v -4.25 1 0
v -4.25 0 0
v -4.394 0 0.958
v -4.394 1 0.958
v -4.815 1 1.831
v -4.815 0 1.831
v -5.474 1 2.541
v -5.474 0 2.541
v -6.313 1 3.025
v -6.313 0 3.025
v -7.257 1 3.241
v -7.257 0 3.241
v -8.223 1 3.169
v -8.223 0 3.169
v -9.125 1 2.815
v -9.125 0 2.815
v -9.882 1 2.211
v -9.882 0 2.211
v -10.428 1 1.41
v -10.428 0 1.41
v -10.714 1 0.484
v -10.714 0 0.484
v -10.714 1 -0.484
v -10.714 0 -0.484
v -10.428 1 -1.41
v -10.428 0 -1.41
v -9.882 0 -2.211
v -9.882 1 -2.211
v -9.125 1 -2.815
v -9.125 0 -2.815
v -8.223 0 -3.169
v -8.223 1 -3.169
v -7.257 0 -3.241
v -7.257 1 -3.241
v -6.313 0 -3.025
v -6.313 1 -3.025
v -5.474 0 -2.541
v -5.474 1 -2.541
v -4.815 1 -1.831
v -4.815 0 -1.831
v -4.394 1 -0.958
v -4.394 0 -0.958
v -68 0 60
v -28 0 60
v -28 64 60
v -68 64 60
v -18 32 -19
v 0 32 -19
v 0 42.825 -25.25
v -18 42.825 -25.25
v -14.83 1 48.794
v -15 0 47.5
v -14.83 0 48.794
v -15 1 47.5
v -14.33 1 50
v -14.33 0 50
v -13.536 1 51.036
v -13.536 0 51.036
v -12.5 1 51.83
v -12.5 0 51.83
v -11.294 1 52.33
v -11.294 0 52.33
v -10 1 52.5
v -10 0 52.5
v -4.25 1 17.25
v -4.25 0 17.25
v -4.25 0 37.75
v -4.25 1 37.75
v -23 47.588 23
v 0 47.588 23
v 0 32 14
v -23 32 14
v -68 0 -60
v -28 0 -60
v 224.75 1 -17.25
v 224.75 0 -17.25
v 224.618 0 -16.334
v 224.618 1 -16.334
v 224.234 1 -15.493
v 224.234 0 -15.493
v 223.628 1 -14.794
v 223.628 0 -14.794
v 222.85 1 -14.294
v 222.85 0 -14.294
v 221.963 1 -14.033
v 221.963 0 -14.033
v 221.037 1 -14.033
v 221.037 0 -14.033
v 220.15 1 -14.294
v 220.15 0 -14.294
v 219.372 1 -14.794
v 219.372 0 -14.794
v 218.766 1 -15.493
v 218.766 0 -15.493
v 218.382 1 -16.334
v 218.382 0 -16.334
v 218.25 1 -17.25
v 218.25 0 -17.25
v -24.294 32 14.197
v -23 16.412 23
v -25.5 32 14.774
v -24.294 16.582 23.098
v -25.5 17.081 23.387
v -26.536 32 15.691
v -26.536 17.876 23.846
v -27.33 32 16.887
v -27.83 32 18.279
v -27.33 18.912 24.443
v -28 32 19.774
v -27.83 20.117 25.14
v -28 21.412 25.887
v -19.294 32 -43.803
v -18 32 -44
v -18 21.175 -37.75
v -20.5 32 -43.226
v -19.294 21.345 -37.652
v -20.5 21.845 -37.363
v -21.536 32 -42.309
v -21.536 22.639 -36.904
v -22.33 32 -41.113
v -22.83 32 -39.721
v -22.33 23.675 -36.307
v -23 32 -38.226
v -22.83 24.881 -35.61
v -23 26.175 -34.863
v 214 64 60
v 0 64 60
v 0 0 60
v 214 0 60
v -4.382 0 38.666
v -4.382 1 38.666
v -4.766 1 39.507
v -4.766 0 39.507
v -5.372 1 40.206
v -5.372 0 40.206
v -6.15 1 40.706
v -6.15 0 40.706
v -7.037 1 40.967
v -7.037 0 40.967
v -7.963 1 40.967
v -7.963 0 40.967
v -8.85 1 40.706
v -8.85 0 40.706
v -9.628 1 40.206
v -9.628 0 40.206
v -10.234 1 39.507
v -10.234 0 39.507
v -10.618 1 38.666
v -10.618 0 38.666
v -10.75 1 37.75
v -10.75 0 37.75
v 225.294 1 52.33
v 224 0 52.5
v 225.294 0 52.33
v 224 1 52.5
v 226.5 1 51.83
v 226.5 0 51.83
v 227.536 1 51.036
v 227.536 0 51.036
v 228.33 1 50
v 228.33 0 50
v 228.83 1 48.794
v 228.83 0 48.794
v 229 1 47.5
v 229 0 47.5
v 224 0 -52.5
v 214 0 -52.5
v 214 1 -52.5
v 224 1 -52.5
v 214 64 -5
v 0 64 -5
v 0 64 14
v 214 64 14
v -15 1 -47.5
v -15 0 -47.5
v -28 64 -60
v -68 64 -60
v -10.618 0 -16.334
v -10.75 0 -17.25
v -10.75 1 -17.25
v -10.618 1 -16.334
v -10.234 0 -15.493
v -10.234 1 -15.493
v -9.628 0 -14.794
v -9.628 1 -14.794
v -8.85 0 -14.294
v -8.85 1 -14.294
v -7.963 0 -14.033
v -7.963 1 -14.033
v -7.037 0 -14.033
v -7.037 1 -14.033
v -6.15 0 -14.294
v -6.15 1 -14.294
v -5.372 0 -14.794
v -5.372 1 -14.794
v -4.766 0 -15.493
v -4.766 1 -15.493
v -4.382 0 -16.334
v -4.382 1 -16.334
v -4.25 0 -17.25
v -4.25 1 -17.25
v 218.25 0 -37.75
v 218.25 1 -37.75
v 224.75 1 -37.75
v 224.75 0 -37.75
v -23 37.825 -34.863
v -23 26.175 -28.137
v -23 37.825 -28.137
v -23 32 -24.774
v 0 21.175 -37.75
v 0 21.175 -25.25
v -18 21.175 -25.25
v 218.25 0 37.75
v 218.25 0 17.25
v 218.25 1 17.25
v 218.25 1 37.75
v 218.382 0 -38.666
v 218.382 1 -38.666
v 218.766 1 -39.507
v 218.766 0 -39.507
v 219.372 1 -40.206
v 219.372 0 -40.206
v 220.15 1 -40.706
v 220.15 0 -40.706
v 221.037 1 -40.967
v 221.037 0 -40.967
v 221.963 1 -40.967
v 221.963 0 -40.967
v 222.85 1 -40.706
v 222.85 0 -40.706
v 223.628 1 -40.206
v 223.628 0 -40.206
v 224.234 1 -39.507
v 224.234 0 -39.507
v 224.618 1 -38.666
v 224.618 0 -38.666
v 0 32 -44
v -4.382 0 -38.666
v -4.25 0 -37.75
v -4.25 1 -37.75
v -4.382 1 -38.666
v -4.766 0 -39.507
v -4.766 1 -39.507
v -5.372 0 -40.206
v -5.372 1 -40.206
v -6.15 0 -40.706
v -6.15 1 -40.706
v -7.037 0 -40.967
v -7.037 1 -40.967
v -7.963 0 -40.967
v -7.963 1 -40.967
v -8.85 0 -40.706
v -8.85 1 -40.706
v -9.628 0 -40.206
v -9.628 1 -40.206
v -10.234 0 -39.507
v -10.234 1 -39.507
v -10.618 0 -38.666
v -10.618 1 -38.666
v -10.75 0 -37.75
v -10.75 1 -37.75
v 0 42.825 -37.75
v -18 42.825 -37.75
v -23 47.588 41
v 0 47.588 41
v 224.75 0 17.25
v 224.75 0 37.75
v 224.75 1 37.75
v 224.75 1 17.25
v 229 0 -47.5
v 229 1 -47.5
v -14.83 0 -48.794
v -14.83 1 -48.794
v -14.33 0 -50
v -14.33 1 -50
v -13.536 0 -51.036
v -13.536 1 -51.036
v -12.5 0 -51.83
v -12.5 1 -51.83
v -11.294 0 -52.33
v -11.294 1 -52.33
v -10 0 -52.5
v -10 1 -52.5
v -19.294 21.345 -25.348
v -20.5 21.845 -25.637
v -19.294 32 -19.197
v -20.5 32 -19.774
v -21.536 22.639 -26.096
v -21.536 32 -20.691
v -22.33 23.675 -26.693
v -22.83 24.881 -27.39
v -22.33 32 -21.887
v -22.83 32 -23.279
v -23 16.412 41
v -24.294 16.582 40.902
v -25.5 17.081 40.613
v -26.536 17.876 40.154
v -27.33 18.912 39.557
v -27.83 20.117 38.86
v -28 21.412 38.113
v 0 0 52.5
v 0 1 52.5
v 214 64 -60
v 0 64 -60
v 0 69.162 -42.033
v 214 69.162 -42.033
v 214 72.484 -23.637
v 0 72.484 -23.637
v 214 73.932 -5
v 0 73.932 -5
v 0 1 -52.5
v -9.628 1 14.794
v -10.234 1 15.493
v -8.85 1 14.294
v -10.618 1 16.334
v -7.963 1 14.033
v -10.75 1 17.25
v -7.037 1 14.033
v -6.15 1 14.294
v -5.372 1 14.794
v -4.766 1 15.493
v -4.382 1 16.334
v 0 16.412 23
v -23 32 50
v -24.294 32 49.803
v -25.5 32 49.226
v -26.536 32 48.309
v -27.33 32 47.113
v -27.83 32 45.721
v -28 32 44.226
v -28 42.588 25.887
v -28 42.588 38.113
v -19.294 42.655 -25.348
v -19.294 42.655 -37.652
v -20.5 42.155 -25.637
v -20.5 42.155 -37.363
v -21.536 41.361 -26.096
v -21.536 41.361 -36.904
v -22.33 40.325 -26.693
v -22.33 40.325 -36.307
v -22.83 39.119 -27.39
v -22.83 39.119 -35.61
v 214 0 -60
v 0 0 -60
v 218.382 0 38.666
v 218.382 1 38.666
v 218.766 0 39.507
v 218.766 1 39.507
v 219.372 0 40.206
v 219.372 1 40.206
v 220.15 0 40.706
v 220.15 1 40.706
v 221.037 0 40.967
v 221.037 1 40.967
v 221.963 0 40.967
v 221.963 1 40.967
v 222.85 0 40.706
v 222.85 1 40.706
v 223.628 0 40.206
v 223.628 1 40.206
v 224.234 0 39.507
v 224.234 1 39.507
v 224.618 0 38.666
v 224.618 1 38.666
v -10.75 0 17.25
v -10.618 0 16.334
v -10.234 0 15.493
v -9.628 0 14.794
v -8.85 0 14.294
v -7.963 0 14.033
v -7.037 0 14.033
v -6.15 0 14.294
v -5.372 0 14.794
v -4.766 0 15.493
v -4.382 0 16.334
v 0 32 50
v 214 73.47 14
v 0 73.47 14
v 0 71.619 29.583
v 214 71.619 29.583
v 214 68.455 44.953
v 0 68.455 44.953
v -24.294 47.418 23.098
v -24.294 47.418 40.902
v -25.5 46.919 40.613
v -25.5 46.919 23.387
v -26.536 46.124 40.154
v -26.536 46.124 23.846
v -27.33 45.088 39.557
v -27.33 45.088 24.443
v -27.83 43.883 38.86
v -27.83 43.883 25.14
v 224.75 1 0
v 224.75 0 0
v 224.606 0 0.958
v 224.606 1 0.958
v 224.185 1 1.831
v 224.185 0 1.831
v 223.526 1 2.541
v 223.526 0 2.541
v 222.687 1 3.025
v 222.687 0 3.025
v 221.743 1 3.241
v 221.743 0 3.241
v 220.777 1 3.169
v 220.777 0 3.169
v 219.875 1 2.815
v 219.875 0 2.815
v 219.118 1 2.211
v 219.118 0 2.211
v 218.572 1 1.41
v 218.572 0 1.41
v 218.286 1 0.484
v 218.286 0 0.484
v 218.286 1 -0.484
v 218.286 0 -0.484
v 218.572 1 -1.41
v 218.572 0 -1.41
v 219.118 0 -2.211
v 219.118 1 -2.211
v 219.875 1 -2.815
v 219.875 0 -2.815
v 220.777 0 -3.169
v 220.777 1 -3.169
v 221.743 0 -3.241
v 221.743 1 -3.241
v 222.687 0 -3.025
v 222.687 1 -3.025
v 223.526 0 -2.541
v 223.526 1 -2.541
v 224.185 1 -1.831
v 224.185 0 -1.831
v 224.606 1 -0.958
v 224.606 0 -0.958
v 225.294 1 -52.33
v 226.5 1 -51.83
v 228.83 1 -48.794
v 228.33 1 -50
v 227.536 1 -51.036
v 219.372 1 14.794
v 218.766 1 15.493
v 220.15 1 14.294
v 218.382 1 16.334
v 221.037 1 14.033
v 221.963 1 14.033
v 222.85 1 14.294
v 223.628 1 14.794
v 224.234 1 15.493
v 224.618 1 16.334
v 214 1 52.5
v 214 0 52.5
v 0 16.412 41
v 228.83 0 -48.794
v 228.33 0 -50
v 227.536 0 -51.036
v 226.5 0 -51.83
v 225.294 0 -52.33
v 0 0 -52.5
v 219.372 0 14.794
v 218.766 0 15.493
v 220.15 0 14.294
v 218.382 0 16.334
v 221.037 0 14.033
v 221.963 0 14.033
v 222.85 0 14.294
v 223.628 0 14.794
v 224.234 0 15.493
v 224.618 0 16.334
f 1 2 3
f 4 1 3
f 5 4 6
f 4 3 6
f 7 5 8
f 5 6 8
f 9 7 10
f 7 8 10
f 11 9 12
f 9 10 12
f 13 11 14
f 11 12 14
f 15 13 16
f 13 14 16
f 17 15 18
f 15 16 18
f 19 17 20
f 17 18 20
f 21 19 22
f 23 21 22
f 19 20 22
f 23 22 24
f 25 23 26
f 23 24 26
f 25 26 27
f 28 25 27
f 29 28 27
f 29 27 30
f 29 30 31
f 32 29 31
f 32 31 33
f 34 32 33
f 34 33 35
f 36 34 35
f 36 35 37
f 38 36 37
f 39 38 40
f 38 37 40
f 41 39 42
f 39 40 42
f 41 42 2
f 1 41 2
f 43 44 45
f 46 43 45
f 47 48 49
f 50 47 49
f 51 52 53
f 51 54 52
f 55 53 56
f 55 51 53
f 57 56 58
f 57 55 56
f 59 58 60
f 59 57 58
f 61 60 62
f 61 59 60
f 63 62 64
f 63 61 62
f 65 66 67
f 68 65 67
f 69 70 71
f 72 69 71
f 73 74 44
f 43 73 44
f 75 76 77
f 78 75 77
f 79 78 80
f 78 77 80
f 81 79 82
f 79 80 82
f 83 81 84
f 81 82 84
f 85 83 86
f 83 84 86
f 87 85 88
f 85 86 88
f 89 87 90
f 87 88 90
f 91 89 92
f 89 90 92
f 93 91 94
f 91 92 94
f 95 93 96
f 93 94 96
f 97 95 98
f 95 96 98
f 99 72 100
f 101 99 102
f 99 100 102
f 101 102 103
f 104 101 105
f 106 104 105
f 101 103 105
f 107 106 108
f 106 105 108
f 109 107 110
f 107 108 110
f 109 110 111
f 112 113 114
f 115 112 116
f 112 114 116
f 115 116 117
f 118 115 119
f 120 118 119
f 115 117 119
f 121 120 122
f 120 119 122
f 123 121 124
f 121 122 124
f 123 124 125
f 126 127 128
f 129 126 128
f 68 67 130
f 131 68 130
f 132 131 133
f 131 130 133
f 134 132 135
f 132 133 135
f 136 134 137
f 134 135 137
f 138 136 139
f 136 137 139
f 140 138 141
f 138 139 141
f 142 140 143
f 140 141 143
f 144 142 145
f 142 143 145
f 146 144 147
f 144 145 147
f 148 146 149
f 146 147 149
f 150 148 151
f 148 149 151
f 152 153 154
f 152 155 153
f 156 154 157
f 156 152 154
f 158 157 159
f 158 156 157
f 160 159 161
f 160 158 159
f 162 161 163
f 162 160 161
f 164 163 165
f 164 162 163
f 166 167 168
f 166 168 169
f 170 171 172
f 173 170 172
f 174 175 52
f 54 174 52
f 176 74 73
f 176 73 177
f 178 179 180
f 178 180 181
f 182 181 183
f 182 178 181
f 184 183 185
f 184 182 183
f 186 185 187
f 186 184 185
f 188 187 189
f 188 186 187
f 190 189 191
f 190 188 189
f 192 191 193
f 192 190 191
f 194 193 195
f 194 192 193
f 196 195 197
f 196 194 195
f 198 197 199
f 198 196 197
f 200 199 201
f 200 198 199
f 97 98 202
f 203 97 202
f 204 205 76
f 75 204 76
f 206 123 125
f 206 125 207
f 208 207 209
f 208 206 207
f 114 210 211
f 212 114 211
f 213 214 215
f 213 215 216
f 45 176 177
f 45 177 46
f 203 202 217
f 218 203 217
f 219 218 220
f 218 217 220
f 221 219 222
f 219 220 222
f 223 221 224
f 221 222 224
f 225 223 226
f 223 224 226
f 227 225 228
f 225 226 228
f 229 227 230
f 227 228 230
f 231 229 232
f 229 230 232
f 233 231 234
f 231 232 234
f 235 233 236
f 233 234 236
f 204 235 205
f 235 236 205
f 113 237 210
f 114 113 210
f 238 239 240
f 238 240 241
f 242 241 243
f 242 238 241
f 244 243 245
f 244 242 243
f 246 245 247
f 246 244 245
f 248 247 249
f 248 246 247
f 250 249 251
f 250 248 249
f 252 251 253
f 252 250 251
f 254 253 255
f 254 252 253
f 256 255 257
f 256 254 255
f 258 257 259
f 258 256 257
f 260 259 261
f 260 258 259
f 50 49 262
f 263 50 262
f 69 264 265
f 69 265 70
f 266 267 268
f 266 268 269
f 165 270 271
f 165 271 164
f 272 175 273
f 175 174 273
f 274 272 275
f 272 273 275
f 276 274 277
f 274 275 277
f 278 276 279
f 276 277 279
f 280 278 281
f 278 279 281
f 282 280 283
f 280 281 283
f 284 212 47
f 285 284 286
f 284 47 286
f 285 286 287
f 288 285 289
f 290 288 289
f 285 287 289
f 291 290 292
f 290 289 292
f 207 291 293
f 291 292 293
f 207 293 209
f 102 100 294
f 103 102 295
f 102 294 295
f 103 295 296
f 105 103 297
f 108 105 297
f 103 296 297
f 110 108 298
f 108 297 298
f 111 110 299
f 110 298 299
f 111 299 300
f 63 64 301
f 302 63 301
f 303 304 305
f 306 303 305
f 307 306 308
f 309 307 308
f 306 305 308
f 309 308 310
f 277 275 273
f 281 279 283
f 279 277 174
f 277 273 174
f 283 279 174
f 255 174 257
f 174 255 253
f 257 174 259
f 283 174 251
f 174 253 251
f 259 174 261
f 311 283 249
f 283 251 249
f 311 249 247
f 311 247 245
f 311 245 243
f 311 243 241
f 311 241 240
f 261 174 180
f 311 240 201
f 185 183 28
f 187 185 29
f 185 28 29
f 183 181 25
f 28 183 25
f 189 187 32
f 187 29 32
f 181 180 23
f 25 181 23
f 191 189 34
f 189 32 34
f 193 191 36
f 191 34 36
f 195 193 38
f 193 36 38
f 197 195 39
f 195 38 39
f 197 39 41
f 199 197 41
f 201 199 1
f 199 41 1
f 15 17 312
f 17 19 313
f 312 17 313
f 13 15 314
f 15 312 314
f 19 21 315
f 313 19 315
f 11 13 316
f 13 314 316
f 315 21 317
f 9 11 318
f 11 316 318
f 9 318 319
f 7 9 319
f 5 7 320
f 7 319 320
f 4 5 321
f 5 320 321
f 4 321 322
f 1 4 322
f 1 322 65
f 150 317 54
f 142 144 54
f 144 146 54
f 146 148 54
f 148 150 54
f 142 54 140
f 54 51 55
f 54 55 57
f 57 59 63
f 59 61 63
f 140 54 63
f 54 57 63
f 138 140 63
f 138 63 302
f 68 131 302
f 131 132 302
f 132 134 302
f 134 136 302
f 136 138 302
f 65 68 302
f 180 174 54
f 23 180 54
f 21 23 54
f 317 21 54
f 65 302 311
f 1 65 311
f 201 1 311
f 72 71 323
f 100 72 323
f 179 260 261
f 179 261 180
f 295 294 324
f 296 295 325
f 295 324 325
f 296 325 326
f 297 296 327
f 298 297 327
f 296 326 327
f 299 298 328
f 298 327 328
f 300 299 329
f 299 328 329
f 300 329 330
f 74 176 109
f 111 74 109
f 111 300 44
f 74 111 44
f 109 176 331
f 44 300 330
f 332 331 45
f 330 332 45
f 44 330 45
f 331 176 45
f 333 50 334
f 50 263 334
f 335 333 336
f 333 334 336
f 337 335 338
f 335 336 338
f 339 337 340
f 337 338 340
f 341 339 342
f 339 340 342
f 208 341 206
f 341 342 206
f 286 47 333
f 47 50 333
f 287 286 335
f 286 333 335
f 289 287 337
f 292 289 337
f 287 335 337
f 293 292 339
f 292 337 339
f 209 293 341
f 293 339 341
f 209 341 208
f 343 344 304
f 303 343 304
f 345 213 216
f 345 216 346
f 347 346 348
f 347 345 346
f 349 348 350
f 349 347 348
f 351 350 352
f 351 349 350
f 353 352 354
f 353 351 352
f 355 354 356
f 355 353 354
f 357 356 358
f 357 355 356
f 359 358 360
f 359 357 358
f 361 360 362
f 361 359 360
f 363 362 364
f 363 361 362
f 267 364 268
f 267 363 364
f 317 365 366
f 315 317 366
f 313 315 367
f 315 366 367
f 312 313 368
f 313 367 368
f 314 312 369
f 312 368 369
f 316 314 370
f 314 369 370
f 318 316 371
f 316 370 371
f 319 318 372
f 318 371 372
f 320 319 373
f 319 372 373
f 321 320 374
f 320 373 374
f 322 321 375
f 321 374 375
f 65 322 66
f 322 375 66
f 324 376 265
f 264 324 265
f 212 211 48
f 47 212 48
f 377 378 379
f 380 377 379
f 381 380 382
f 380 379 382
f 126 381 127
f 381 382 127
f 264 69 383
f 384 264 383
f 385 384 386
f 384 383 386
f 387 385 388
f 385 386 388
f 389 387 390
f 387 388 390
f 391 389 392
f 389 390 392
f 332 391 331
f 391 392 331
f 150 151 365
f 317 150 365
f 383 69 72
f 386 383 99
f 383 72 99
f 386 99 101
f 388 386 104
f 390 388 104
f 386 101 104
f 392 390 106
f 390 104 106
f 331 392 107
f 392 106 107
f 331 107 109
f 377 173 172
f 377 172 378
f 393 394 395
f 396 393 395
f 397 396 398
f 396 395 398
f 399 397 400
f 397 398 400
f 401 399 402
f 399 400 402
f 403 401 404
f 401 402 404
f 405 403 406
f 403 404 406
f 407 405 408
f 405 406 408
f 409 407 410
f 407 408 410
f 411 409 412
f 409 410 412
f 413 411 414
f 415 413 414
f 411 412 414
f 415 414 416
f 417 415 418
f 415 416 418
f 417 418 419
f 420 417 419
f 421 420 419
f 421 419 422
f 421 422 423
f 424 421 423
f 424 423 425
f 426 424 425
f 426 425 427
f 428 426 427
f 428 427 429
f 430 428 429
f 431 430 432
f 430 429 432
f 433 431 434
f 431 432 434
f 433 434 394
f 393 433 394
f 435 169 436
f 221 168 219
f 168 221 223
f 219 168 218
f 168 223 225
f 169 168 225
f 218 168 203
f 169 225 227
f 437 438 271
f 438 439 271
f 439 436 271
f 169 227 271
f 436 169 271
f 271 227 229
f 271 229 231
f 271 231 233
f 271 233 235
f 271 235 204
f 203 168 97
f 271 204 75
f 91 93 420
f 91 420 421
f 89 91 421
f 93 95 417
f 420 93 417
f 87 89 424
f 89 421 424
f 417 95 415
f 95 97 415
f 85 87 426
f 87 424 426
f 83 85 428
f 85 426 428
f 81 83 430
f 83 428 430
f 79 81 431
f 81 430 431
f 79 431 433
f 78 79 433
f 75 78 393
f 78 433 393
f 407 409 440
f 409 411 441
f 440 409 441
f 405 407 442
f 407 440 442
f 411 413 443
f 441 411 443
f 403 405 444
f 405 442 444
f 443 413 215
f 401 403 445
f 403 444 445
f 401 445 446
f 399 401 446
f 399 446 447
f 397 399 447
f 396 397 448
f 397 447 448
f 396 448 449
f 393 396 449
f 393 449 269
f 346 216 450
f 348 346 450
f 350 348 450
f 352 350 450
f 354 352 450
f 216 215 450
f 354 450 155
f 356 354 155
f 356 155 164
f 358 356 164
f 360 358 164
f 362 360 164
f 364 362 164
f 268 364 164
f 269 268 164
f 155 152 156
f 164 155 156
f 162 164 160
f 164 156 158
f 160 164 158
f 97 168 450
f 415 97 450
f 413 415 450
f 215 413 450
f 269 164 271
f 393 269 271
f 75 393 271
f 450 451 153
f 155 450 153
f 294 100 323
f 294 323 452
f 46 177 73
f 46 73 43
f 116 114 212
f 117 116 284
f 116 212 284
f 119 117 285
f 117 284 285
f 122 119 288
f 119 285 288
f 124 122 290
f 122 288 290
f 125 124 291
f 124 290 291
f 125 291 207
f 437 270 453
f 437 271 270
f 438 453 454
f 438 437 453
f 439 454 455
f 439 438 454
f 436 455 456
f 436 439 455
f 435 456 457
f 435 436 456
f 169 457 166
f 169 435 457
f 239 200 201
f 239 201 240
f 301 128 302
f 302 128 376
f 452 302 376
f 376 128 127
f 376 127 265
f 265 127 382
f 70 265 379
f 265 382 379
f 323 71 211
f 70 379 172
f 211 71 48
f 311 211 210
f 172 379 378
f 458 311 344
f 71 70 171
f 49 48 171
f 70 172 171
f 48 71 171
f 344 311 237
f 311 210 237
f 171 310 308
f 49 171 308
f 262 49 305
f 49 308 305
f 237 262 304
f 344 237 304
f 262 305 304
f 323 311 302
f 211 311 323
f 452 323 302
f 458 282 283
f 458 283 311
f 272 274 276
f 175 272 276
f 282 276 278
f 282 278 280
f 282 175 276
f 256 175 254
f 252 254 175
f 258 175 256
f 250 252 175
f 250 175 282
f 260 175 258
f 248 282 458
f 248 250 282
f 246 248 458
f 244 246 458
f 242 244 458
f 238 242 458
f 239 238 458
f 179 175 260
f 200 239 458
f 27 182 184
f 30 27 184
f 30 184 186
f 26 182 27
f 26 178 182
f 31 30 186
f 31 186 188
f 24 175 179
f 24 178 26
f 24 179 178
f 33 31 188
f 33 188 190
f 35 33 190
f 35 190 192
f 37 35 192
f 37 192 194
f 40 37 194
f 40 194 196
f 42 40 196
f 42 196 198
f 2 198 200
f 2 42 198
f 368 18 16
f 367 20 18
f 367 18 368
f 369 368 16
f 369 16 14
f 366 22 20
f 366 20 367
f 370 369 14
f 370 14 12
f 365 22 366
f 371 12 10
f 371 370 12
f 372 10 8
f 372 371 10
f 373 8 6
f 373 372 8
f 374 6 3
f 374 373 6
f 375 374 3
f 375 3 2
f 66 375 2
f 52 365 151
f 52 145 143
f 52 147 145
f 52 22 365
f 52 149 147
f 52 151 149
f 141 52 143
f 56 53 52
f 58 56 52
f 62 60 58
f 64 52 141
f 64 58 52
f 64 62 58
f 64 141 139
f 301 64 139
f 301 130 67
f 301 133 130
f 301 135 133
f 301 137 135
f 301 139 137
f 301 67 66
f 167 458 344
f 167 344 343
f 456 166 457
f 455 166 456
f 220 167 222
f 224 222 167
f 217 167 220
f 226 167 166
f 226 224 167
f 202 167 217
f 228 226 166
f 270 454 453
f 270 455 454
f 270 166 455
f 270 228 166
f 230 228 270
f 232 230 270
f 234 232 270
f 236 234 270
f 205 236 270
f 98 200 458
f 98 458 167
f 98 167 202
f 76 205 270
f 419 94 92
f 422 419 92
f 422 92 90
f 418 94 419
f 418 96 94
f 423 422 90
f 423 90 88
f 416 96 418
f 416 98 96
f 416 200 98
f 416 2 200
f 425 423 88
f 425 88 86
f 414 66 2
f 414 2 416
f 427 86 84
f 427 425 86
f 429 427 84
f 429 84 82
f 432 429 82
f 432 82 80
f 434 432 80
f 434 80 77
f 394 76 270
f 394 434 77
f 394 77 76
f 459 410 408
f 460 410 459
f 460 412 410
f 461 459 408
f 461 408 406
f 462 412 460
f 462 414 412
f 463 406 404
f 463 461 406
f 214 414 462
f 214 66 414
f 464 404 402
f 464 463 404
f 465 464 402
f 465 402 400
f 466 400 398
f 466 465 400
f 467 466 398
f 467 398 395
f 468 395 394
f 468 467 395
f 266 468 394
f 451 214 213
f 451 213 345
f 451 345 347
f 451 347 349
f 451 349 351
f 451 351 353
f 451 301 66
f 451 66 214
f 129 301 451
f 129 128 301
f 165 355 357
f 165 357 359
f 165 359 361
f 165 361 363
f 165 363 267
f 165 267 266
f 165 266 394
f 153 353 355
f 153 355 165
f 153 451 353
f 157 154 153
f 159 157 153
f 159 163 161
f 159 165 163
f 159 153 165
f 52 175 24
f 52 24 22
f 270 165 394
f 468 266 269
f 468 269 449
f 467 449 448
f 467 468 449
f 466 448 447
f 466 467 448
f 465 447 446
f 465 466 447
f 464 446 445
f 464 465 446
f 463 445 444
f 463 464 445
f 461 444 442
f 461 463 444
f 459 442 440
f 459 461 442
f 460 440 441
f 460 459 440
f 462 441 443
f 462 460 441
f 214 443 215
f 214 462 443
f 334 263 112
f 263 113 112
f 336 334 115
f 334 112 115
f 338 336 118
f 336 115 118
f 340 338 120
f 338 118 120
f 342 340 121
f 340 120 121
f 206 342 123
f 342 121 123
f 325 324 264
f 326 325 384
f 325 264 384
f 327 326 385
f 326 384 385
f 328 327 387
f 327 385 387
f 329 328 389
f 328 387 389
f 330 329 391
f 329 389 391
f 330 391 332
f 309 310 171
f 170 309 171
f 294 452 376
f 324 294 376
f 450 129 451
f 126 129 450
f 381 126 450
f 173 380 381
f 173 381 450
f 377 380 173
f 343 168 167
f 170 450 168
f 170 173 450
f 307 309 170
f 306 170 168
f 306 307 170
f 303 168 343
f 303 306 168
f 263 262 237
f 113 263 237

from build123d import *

# Parameters (mm, degrees)
EXTRUDE_1_DEPTH = 214
EXTRUDE_2_DEPTH = 23
EXTRUDE_3_DEPTH = 28
FILLET_1_R      = 5
SKETCH_4_W      = 244
SKETCH_4_H      = 105
SKETCH_4_R      = 3.25
EXTRUDE_4_DEPTH = 1
FILLET_2_R      = 5
SKETCH_5_W      = 120
SKETCH_5_H      = 64
EXTRUDE_5_DEPTH = 40


with BuildPart() as part:
    # Эскиз1 → Бобышка-Вытянуть1 (new body)
    with BuildSketch(Plane(origin=(0, 0, 0), x_dir=(0, 0, -1), z_dir=(1, 0, 0))):
        with BuildLine():
            Line((-60, 0), (60, 0))
            Line((60, 0), (60, 64))
            ThreePointArc((60, 64), (32.877245052, 71.055175037), (5, 73.932420089))
            Line((5, 73.932420089), (5, 64))
            Line((5, 64), (-14, 64))
            Line((-14, 64), (-14, 73.469509676))
            ThreePointArc((-14, 73.469509676), (-37.301714483, 70.200392098), (-60, 64))
            Line((-60, 64), (-60, 0))
        make_face()
    extrude(amount=EXTRUDE_1_DEPTH)

    # Эскиз2 → Бобышка-Вытянуть2 (add)
    with BuildSketch(Plane.ZY):
        Polygon((-19, 32), (-25.25, 42.825317547), (-37.75, 42.825317547), (-44, 32), (-37.75, 21.174682453), (-25.25, 21.174682453), align=None)
    extrude(amount=EXTRUDE_2_DEPTH)

    # Эскиз2<3> → Бобышка-Вытянуть3 (add)
    with BuildSketch(Plane.ZY):
        Polygon((50, 32), (41, 47.588457268), (23, 47.588457268), (14, 32), (23, 16.411542732), (41, 16.411542732), align=None)
    extrude(amount=EXTRUDE_3_DEPTH)

    # Скругление1
    fillet_1_edges = [part.edges().sort_by_distance(p)[0] for p in [
        (-23, 42.825317547, -31.5),
        (-23, 37.412658774, -40.875),
        (-23, 26.587341226, -40.875),
        (-23, 21.174682453, -31.5),
        (-23, 26.587341226, -22.125),
        (-23, 37.412658774, -22.125),
        (-28, 39.794228634, 45.5),
        (-28, 47.588457268, 32),
        (-28, 39.794228634, 18.5),
        (-28, 24.205771366, 18.5),
        (-28, 16.411542732, 32),
        (-28, 24.205771366, 45.5),
    ]]
    fillet(fillet_1_edges, radius=FILLET_1_R)

    # Эскиз4 → Бобышка-Вытянуть4 (add)
    with BuildSketch(Plane.XZ):
        with Locations((107, 0)):
            Rectangle(SKETCH_4_W, SKETCH_4_H)
        with Locations((221.5, 0)):
            Circle(SKETCH_4_R, mode=Mode.SUBTRACT)
        with Locations((-7.5, 0)):
            Circle(SKETCH_4_R, mode=Mode.SUBTRACT)
        with BuildLine():
            Line((224.75, 37.75), (224.75, 17.25))
            ThreePointArc((224.75, 17.25), (221.5, 14), (218.25, 17.25))
            Line((218.25, 17.25), (218.25, 37.75))
            ThreePointArc((218.25, 37.75), (221.5, 41), (224.75, 37.75))
        make_face(mode=Mode.SUBTRACT)
        with BuildLine():
            Line((224.75, -37.75), (224.75, -17.25))
            ThreePointArc((224.75, -17.25), (221.5, -14), (218.25, -17.25))
            Line((218.25, -17.25), (218.25, -37.75))
            ThreePointArc((218.25, -37.75), (221.5, -41), (224.75, -37.75))
        make_face(mode=Mode.SUBTRACT)
        with BuildLine():
            Line((-10.75, 37.75), (-10.75, 17.25))
            ThreePointArc((-10.75, 17.25), (-7.5, 14), (-4.25, 17.25))
            Line((-4.25, 17.25), (-4.25, 37.75))
            ThreePointArc((-4.25, 37.75), (-7.5, 41), (-10.75, 37.75))
        make_face(mode=Mode.SUBTRACT)
        with BuildLine():
            Line((-10.75, -37.75), (-10.75, -17.25))
            ThreePointArc((-10.75, -17.25), (-7.5, -14), (-4.25, -17.25))
            Line((-4.25, -17.25), (-4.25, -37.75))
            ThreePointArc((-4.25, -37.75), (-7.5, -41), (-10.75, -37.75))
        make_face(mode=Mode.SUBTRACT)
    extrude(amount=-EXTRUDE_4_DEPTH)

    # Скругление2
    fillet_2_edges = [part.edges().sort_by_distance(p)[0] for p in [
        (229, 0.5, -52.5),
        (-15, 0.5, -52.5),
        (-15, 0.5, 52.5),
        (229, 0.5, 52.5),
    ]]
    fillet(fillet_2_edges, radius=FILLET_2_R)

    # Эскиз5 → Бобышка-Вытянуть5 (add)
    with BuildSketch(Plane.ZY.offset(28)):
        with Locations((0, 32)):
            Rectangle(SKETCH_5_W, SKETCH_5_H)
    extrude(amount=EXTRUDE_5_DEPTH)


solid = part.part
